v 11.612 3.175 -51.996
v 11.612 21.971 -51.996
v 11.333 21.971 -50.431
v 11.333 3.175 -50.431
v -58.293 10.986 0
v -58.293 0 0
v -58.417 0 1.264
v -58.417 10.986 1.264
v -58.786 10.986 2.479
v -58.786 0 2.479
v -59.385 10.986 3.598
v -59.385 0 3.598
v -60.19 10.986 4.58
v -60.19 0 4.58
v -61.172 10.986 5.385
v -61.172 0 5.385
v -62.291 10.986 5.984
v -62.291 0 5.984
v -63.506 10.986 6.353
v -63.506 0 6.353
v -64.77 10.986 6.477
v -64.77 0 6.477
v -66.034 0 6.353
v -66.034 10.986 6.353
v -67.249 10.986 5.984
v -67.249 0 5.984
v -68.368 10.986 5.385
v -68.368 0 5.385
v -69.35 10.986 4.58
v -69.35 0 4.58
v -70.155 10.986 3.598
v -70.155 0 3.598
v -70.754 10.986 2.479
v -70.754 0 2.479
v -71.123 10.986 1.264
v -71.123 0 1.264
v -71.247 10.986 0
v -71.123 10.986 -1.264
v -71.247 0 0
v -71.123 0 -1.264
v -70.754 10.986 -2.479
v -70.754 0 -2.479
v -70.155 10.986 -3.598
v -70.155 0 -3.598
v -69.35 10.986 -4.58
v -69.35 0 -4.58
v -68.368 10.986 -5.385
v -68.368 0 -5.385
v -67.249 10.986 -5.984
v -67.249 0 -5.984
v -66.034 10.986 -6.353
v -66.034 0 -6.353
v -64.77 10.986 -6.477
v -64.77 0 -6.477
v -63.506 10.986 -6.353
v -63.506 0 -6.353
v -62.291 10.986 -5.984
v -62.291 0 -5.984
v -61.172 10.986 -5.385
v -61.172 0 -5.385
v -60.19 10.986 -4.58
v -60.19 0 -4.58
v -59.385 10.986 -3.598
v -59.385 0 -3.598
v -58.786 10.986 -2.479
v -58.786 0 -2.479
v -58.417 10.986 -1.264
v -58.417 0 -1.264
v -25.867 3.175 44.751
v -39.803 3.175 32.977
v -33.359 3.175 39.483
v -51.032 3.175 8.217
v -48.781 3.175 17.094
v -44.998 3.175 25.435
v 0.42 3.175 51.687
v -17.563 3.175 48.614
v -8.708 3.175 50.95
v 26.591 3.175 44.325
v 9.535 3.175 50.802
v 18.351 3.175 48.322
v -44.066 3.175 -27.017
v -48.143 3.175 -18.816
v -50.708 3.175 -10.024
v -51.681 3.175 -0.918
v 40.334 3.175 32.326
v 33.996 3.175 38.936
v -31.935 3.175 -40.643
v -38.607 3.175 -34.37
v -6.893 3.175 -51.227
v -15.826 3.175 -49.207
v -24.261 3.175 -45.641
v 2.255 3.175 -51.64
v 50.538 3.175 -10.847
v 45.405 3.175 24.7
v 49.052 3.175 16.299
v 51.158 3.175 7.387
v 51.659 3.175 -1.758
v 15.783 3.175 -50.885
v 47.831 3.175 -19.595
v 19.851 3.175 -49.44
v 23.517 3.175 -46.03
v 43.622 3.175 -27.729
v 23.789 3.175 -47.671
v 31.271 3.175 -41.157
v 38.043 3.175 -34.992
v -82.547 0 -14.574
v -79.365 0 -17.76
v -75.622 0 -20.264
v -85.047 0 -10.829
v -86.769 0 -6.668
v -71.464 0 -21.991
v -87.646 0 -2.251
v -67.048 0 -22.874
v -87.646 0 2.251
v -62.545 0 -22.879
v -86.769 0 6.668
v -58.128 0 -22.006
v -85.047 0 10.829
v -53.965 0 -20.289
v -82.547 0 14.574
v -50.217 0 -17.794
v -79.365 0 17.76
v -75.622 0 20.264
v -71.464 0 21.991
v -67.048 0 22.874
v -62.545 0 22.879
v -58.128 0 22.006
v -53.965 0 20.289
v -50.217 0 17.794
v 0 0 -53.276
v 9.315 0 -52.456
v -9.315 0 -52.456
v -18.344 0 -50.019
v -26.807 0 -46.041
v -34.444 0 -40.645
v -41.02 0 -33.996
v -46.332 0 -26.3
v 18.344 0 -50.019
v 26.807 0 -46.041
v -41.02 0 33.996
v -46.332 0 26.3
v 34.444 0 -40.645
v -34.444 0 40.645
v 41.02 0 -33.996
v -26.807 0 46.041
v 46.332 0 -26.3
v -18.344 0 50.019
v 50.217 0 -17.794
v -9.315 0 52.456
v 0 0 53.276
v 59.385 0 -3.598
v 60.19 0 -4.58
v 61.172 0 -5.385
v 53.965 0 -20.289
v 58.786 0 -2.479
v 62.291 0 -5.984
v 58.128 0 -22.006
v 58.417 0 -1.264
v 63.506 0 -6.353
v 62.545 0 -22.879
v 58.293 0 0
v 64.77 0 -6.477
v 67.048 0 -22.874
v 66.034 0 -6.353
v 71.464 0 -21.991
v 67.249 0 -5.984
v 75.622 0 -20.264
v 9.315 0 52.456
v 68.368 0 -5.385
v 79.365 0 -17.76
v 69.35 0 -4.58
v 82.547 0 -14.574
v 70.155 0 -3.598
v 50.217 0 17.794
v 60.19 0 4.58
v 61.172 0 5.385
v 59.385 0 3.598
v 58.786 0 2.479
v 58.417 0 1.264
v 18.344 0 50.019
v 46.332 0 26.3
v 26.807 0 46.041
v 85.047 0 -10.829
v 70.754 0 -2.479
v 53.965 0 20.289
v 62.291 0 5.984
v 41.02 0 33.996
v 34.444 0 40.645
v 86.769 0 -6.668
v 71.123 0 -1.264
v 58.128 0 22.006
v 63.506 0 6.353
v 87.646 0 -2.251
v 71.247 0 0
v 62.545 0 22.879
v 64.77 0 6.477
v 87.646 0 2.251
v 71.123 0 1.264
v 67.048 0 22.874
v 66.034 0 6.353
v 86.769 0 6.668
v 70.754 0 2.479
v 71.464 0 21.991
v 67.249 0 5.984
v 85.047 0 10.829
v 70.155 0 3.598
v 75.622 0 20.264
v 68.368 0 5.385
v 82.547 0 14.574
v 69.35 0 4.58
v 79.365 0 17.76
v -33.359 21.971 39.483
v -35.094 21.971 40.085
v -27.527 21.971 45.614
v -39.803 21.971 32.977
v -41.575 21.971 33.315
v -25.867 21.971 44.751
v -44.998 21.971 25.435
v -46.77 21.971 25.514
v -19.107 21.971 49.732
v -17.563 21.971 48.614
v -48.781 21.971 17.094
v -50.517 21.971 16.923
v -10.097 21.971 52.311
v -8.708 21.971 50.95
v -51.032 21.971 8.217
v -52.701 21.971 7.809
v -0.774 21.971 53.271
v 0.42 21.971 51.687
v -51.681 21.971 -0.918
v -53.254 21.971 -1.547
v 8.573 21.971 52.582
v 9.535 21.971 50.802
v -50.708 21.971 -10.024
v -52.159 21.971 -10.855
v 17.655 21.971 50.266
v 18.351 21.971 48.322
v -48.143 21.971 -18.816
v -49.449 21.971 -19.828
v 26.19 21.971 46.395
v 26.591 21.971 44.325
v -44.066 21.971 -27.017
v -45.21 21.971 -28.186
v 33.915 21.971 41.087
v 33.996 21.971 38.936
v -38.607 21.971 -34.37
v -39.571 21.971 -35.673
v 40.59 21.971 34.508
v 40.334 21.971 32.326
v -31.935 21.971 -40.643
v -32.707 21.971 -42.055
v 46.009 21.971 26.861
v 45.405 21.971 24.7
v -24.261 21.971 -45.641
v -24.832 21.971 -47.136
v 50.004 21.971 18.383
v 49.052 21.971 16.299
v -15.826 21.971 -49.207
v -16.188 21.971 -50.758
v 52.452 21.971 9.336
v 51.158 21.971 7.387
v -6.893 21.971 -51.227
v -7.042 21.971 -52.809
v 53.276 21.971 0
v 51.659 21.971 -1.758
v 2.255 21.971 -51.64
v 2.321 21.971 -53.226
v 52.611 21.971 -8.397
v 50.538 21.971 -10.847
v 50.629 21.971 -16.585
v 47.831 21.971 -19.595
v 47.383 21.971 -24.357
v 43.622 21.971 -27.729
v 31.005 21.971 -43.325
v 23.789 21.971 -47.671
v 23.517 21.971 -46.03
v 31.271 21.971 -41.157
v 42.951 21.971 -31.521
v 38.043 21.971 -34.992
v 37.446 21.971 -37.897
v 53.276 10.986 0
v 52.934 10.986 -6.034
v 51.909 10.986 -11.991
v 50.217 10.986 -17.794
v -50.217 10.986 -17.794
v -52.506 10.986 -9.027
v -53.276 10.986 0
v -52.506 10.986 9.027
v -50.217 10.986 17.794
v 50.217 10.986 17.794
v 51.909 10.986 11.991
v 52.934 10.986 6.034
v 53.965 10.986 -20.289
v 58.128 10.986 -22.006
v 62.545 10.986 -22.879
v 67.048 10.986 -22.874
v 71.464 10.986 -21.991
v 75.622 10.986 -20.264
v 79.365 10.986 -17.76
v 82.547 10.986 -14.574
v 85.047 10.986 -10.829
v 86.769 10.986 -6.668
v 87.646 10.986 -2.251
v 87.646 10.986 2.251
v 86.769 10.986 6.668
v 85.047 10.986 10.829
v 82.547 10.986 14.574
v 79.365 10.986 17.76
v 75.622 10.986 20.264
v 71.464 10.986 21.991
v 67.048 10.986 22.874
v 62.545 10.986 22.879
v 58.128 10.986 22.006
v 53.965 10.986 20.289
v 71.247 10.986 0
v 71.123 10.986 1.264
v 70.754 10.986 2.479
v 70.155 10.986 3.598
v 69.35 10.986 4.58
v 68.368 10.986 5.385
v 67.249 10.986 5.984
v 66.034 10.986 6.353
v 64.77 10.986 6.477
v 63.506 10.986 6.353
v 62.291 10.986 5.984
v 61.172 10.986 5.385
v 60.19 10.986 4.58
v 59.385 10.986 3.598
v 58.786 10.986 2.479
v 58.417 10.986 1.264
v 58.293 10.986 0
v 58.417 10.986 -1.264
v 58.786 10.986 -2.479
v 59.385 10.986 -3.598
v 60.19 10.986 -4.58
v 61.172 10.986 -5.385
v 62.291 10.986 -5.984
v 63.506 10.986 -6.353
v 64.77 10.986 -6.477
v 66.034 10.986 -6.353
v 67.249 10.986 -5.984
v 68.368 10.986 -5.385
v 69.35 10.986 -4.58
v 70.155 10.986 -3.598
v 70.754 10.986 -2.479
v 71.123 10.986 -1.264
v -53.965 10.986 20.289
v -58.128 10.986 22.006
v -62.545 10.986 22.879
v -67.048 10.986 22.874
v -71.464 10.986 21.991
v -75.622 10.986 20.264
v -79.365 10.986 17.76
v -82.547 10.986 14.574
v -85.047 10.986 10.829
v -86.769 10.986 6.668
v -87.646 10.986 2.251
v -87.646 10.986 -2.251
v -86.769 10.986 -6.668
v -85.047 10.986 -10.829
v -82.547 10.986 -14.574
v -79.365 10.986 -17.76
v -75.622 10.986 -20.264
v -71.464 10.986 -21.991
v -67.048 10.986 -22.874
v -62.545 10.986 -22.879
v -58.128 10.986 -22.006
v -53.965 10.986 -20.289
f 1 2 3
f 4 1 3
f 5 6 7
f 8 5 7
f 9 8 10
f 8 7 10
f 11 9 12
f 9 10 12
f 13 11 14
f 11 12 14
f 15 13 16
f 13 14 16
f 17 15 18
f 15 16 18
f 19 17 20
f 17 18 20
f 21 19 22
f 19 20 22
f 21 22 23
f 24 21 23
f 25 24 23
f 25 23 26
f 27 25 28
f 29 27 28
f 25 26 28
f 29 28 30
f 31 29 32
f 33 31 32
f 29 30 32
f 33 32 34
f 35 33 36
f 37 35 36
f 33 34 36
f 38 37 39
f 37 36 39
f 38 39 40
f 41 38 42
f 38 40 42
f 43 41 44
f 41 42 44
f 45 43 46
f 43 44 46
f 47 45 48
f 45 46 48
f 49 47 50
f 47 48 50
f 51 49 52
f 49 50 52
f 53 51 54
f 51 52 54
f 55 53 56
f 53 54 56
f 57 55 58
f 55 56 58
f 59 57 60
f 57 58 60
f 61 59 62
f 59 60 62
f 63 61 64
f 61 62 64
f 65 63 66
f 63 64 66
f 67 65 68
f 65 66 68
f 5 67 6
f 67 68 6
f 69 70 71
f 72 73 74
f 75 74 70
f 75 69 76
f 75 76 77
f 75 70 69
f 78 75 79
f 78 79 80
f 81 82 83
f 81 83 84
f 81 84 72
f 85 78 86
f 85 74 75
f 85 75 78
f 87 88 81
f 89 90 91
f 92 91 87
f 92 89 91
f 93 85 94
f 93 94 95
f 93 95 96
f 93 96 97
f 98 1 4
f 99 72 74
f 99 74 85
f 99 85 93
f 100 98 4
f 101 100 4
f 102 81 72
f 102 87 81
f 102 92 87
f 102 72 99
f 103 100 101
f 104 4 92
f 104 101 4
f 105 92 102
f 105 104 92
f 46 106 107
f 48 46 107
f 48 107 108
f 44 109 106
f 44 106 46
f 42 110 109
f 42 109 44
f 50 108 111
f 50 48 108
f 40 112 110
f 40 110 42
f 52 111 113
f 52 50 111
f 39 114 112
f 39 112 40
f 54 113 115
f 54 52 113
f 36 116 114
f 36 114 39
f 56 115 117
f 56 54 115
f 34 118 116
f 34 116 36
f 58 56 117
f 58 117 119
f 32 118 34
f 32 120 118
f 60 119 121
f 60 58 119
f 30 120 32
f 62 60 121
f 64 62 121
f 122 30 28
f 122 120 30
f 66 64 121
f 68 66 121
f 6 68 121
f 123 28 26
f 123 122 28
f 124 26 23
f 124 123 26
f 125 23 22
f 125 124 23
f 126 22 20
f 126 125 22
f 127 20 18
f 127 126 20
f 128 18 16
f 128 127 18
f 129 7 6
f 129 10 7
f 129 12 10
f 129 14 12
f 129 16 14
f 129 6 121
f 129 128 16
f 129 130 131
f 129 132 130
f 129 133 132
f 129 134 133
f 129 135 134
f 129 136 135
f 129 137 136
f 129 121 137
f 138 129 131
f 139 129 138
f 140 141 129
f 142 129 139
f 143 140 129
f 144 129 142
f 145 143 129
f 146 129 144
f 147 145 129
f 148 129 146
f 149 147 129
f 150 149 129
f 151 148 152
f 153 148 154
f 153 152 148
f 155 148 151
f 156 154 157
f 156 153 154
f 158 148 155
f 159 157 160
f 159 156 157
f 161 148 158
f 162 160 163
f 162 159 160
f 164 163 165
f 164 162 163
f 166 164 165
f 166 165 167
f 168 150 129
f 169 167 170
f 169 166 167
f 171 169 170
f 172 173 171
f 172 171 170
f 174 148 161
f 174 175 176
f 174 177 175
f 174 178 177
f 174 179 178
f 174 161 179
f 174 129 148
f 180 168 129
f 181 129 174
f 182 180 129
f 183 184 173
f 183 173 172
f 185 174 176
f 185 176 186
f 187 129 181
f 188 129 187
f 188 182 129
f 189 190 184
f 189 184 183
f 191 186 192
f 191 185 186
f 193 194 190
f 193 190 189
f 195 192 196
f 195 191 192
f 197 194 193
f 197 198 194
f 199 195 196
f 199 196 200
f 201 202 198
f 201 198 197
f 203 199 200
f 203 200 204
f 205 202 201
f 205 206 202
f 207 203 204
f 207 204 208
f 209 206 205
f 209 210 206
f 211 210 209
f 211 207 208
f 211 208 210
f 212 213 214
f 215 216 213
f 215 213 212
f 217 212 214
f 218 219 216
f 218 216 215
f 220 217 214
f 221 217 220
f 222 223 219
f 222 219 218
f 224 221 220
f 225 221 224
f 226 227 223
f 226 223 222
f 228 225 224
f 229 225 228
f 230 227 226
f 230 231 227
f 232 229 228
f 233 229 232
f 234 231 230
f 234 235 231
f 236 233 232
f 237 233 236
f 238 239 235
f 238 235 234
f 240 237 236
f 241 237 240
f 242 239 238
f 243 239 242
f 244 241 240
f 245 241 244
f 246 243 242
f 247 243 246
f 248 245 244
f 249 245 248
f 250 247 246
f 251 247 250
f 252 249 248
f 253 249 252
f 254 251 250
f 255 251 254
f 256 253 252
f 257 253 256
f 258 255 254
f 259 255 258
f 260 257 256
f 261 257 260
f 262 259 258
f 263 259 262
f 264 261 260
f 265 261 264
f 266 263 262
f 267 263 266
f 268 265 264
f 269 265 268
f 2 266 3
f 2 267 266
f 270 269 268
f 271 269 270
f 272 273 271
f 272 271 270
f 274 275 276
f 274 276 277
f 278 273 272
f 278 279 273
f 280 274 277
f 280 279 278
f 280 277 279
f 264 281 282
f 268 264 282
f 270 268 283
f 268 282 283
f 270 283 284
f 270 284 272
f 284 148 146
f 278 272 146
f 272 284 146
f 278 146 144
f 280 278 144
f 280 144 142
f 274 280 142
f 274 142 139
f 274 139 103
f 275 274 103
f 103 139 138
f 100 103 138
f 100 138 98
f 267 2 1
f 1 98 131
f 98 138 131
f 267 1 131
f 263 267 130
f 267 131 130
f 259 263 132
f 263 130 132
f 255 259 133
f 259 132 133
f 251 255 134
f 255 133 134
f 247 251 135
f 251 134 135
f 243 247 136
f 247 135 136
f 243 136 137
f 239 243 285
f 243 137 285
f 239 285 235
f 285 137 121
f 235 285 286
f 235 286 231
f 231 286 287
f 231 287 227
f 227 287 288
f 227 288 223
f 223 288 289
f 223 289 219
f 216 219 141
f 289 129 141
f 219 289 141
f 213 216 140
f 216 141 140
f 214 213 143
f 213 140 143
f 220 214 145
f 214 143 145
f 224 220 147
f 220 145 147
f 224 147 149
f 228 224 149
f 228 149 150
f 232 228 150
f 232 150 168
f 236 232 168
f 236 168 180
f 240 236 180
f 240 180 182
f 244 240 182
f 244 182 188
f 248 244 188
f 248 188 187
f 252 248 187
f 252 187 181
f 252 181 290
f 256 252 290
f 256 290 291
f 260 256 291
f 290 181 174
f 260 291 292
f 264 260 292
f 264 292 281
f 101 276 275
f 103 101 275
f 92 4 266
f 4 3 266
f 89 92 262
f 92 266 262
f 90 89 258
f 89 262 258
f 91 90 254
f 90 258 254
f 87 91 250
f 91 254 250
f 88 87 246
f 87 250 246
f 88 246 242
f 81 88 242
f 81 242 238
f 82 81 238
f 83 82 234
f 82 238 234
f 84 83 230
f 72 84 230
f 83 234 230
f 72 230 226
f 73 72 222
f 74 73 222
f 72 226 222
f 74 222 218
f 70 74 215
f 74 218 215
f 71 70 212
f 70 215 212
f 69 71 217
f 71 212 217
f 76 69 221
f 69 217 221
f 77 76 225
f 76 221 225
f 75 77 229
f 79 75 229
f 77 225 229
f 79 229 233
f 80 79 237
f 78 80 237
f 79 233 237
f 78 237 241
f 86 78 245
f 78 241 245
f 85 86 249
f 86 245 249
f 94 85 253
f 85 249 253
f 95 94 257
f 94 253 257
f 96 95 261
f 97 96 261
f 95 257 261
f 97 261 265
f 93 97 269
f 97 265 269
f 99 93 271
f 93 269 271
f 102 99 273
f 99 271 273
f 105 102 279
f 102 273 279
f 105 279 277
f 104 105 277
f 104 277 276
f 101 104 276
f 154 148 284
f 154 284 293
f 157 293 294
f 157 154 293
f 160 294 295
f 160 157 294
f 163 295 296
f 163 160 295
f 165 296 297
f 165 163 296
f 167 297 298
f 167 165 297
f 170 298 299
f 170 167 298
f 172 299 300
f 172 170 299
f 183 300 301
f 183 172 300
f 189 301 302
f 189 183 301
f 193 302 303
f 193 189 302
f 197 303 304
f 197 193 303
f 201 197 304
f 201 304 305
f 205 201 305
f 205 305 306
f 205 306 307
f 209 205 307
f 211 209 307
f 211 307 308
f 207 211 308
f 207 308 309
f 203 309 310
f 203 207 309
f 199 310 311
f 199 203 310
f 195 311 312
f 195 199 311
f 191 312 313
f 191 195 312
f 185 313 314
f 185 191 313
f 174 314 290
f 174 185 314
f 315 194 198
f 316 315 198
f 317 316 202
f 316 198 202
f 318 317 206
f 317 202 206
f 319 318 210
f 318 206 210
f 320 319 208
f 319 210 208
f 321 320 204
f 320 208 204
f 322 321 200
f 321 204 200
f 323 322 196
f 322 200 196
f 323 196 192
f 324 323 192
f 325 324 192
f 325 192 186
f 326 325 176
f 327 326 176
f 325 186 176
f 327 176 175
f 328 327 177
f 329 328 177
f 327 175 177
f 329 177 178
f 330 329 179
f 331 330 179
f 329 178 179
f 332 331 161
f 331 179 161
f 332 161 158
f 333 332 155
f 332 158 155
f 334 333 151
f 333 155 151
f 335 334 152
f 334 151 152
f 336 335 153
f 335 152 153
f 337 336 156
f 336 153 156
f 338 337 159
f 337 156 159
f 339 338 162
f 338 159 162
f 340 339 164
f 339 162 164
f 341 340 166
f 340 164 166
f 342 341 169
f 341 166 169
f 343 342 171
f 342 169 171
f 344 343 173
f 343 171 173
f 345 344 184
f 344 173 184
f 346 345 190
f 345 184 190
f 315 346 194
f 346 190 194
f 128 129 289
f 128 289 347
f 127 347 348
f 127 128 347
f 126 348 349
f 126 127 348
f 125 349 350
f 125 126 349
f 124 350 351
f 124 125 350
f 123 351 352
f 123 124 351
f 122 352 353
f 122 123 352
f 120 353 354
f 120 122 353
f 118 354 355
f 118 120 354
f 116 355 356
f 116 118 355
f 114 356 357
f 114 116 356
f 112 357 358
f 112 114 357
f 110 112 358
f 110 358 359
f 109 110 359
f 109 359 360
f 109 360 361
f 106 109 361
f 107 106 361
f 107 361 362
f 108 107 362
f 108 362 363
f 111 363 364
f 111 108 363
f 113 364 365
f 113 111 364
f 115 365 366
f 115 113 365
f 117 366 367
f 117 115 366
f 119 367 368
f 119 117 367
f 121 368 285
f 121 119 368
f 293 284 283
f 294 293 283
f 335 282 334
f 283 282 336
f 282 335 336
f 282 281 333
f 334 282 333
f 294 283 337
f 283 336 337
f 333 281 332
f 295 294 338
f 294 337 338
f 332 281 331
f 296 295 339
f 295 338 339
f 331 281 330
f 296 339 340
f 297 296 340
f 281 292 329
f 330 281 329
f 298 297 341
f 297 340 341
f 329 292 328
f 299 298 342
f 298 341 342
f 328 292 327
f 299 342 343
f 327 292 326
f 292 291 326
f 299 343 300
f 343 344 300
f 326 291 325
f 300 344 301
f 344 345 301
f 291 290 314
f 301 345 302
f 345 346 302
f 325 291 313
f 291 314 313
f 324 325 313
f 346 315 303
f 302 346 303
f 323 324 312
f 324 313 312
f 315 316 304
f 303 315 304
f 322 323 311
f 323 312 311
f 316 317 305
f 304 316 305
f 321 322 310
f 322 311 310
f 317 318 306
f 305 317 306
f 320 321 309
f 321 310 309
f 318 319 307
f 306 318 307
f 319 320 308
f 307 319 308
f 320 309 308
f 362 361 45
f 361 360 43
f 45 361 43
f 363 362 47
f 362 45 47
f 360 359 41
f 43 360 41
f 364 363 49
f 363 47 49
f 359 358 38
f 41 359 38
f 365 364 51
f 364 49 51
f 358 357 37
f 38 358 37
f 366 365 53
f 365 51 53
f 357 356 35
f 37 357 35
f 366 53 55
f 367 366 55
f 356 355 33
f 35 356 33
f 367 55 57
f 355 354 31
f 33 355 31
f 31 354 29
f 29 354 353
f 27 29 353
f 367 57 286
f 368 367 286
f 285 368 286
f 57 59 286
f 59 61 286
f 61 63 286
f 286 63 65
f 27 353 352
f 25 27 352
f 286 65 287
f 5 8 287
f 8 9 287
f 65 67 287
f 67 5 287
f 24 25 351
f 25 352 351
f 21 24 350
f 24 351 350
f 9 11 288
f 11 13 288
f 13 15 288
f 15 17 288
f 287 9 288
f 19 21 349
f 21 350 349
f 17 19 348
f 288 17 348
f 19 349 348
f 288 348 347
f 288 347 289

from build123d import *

# Parameters (mm, degrees)
SKETCH1_R           = 53.2765
BOSS_EXTRUDE1_DEPTH = 21.971
SKETCH3_R           = 51.689
CUT_EXTRUDE2_DEPTH  = 18.796
CUT_EXTRUDE7_DEPTH  = 18.796
SKETCH7_R           = 6.477
BOSS_EXTRUDE3_DEPTH = 10.9855


with BuildPart() as part:
    # Sketch1 → Boss-Extrude1 (new body)
    with BuildSketch(Plane(origin=(0, 0, 0), x_dir=(1, 0, 0), z_dir=(0, 1, 0))):
        Circle(SKETCH1_R)
    extrude(amount=BOSS_EXTRUDE1_DEPTH)

    # Sketch3 → Cut-Extrude2 (cut)
    with BuildSketch(Plane(origin=(0, 21.971, 0), x_dir=(1, 0, 0), z_dir=(0, 1, 0))):
        Circle(SKETCH3_R)
    extrude(amount=-CUT_EXTRUDE2_DEPTH, mode=Mode.SUBTRACT)

    # Sketch6 → Cut-Extrude7 (cut)
    with BuildSketch(Plane(origin=(0, 21.971, 0), x_dir=(1, 0, 0), z_dir=(0, 1, 0))):
        with BuildLine():
            Line((23.516654444, 46.029552298), (23.788647289, 47.670595889))
            ThreePointArc((23.788647289, 47.670595889), (17.831858769, 50.203687764), (11.611838625, 51.995679205))
            Line((11.611838625, 51.995679205), (11.333405616, 50.431206987))
            ThreePointArc((11.333405616, 50.431206987), (17.563465277, 48.613551696), (23.516654444, 46.029552298))
        make_face()
    extrude(amount=-CUT_EXTRUDE7_DEPTH, mode=Mode.SUBTRACT)

    # Sketch7 → Boss-Extrude3 (add)
    with BuildSketch(Plane.XZ):
        with BuildLine():
            ThreePointArc((50.217200735, -17.793768644), (87.757, 0), (50.217200735, 17.793768644))
            ThreePointArc((50.217200735, 17.793768644), (53.2765, 0), (50.217200735, -17.793768644))
        make_face()
        with Locations((64.77, 0)):
            Circle(SKETCH7_R, mode=Mode.SUBTRACT)
        with BuildLine():
            ThreePointArc((-50.217200735, 17.793768644), (-87.757, 0), (-50.217200735, -17.793768644))
            ThreePointArc((-50.217200735, -17.793768644), (-53.2765, 0), (-50.217200735, 17.793768644))
        make_face()
        with Locations((-64.77, 0)):
            Circle(SKETCH7_R, mode=Mode.SUBTRACT)
    extrude(amount=-BOSS_EXTRUDE3_DEPTH)


solid = part.part
